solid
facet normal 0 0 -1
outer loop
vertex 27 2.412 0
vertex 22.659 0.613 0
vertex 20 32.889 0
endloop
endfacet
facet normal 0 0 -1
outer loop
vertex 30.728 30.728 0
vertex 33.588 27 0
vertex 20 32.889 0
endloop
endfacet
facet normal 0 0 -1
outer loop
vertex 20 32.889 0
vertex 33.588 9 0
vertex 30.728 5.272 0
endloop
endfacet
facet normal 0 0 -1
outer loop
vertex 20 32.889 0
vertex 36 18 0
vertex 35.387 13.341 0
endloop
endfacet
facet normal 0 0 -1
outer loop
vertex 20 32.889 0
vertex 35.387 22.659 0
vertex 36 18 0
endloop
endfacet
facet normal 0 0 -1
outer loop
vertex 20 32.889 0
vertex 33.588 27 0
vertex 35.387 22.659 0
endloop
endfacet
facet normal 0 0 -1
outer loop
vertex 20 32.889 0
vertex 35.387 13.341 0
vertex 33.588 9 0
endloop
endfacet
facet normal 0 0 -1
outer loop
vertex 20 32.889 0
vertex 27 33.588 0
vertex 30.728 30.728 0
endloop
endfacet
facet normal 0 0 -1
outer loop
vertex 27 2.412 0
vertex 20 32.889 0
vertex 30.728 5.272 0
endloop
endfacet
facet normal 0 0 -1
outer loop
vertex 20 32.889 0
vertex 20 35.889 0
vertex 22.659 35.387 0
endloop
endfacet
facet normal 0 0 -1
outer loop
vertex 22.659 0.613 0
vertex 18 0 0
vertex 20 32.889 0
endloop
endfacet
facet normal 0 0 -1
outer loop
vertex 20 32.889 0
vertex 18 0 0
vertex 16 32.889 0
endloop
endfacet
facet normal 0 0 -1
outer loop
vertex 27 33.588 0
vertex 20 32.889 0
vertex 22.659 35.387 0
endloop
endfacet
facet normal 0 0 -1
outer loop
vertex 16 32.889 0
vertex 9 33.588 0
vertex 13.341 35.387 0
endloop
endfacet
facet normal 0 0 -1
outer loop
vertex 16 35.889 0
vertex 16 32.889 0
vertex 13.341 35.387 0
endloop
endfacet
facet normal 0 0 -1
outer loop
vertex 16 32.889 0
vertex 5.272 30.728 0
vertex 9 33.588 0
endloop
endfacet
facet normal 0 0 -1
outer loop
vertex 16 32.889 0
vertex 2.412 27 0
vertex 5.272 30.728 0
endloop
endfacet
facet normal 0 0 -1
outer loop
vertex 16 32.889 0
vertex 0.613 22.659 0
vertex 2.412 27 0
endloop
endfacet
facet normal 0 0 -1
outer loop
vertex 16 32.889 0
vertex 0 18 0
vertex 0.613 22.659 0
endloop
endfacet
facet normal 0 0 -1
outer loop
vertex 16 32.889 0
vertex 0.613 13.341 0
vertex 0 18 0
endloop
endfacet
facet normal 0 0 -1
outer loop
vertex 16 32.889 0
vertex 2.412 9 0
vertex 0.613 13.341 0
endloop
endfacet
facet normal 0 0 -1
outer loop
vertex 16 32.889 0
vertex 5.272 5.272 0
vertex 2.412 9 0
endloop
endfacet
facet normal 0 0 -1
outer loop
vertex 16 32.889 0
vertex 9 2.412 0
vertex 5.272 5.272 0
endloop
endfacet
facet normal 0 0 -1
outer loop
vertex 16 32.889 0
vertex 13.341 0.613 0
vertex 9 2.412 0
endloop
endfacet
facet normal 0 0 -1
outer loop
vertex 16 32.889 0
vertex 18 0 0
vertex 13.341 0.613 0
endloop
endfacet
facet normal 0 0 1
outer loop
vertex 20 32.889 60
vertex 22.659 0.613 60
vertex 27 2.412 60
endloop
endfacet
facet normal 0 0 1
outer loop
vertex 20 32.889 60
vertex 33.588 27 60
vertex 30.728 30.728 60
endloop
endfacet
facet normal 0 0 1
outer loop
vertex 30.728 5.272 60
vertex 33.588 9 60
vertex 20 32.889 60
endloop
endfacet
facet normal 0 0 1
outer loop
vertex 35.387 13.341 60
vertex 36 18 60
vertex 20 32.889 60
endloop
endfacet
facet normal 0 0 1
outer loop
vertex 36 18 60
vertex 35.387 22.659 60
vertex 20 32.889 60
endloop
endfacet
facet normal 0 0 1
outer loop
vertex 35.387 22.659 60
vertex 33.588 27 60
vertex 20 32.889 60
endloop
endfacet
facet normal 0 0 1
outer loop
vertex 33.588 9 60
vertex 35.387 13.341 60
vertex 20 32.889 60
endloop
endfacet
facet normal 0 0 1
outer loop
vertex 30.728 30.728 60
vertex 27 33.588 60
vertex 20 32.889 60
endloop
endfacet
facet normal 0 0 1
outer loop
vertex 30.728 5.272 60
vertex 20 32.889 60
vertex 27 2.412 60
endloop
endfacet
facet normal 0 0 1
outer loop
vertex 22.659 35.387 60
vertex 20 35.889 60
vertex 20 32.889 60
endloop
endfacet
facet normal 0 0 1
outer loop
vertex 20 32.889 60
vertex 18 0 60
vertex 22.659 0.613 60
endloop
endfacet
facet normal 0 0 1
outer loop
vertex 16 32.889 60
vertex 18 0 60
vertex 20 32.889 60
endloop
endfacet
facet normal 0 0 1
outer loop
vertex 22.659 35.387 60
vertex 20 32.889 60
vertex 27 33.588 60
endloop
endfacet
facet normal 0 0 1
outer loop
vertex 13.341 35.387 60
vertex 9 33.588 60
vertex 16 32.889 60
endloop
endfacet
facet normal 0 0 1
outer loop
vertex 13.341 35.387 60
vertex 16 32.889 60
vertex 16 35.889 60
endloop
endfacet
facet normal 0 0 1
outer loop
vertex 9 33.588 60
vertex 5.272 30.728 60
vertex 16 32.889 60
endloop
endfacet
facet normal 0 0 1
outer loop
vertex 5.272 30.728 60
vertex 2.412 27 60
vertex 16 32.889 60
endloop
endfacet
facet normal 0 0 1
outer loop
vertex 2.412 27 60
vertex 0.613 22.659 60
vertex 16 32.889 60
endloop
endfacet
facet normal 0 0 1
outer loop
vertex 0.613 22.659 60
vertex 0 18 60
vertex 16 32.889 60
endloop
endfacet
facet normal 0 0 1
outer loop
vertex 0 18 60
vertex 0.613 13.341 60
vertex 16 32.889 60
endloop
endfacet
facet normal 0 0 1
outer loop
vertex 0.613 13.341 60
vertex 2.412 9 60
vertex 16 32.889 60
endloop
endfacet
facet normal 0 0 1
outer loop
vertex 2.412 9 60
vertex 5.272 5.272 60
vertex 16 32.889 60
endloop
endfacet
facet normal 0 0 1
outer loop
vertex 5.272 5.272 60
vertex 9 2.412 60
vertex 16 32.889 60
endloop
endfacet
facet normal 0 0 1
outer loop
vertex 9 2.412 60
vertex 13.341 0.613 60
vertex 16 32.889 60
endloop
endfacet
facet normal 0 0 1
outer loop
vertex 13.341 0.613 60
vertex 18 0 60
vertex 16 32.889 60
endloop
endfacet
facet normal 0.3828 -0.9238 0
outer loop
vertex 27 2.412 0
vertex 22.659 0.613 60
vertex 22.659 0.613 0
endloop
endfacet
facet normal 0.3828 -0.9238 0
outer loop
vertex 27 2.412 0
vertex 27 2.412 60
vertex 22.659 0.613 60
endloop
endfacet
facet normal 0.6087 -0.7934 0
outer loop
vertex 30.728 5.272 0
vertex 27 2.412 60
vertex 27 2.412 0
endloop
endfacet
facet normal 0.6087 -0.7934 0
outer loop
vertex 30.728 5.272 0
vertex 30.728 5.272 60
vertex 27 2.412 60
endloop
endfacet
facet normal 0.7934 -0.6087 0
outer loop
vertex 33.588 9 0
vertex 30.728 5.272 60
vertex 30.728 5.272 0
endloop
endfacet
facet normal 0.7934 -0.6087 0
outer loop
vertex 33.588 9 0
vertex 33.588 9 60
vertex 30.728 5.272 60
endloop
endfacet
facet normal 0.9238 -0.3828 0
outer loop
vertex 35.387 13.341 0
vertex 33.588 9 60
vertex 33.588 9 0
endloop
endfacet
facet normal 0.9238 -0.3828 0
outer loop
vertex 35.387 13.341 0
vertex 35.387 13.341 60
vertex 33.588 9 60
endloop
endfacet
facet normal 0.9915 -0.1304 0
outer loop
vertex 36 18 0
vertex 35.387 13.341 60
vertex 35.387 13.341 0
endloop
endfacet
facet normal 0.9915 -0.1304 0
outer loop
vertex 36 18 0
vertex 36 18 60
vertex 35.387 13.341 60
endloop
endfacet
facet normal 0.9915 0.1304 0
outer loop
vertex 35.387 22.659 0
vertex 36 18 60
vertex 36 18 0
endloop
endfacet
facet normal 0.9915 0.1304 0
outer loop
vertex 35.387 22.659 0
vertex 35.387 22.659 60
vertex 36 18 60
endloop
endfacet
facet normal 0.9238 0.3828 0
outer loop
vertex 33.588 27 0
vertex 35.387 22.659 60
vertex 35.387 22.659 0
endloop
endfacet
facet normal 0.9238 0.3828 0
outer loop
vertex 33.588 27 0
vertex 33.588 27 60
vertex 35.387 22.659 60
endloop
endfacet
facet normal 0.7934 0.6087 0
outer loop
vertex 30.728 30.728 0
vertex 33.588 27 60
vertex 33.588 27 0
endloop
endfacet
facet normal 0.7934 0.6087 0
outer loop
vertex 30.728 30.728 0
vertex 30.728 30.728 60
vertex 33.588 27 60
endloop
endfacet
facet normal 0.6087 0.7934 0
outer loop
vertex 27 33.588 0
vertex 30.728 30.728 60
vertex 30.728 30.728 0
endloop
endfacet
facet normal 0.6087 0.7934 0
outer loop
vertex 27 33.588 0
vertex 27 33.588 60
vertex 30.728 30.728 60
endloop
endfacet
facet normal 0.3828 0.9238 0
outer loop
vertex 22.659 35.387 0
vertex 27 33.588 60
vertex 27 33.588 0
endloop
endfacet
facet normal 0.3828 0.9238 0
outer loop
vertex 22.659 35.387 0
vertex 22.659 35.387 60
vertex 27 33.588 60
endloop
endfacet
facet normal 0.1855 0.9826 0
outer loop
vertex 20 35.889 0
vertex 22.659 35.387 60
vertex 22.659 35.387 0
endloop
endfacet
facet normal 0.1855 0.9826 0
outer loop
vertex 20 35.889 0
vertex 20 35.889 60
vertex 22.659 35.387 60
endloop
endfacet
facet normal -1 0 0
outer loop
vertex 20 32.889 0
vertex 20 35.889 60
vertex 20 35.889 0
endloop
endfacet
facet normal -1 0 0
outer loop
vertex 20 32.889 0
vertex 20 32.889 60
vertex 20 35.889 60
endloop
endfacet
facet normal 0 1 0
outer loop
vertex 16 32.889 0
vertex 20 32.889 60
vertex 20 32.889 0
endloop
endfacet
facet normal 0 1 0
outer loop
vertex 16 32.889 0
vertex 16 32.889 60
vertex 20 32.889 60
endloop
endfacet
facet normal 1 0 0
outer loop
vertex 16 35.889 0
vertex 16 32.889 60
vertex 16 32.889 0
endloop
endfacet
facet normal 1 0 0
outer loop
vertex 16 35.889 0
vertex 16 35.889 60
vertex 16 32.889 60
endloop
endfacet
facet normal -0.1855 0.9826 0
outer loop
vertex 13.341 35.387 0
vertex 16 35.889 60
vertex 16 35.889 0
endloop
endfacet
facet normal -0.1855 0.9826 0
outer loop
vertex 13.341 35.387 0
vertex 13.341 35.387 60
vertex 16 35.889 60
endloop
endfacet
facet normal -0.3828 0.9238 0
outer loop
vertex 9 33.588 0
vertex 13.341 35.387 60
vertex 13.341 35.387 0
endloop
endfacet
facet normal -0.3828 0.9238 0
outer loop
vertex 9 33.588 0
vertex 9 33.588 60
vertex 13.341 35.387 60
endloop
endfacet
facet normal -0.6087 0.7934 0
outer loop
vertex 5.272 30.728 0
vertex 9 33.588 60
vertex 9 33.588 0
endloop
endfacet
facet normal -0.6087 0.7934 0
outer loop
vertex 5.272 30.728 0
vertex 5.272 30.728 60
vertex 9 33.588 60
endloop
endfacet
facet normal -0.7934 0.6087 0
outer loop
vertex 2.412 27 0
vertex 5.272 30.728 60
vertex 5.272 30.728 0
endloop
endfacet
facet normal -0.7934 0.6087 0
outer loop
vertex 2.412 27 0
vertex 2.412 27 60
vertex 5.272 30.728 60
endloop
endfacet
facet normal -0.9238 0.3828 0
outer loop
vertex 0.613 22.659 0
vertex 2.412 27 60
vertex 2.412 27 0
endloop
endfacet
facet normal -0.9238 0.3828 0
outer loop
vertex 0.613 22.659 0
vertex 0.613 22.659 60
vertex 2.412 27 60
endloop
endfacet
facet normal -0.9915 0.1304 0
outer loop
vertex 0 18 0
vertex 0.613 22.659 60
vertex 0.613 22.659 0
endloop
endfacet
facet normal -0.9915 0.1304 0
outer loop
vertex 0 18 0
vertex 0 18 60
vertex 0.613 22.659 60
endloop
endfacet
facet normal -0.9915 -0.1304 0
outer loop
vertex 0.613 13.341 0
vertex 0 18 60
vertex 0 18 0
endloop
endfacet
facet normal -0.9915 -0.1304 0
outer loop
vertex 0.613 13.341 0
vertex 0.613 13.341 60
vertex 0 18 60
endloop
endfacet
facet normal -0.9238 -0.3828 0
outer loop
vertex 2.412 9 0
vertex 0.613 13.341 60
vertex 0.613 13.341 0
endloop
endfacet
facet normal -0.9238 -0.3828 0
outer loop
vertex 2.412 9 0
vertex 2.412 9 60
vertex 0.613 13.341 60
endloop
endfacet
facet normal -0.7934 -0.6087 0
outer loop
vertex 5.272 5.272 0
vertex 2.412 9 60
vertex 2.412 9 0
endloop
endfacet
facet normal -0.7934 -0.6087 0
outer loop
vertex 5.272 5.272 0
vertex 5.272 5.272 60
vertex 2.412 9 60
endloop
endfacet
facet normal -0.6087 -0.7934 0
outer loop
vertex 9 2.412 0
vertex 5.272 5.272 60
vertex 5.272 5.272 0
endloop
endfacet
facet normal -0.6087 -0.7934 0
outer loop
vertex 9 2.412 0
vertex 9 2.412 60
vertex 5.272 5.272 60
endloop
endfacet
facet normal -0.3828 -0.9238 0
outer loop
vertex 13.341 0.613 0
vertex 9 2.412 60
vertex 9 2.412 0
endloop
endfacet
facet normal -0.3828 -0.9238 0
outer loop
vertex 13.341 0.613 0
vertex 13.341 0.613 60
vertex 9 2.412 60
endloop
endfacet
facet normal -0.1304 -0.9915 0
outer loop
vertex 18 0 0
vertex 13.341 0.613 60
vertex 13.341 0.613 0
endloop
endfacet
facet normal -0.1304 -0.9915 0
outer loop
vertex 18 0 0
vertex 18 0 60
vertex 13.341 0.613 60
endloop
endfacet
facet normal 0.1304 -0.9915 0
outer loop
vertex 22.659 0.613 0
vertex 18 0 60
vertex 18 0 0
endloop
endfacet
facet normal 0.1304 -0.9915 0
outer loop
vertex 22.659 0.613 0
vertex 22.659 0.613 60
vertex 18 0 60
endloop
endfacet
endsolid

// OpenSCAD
$fn = 32;

// ----------------------------------------------------------------------
// Keyway shaft: d36 shaft, key 4 x 3 mm
// ----------------------------------------------------------------------

// --- parameters (mm) ---
shaft_r = 18;             // shaft radius
key_w = 4;                // keyway width
key_d = 3;                // keyway depth below the surface line
plate_t = 60;             // shaft length, Z (extrusion height)
fit_tol = 0.05;           // declared fit tolerance (prompt contract)
free_tol = 0.3;           // declared free tolerance (prompt contract)

shaft_d = 2 * shaft_r;  // shaft diameter
circle_step = 15;  // polygon sampling step, degrees

profile = [[13.341, 35.387], [9, 33.588], [5.272, 30.728], [2.412, 27], [0.613, 22.659], [0, 18], [0.613, 13.341], [2.412, 9], [5.272, 5.272], [9, 2.412], [13.341, 0.613], [18, 0], [22.659, 0.613], [27, 2.412], [30.728, 5.272], [33.588, 9], [35.387, 13.341], [36, 18], [35.387, 22.659], [33.588, 27], [30.728, 30.728], [27, 33.588], [22.659, 35.387], [20, 35.889], [20, 32.889], [16, 32.889], [16, 35.889]];  // primary outline, 27 points, counter clockwise

// --- the one profile operation ---
linear_extrude(height = plate_t) polygon(points = profile);
